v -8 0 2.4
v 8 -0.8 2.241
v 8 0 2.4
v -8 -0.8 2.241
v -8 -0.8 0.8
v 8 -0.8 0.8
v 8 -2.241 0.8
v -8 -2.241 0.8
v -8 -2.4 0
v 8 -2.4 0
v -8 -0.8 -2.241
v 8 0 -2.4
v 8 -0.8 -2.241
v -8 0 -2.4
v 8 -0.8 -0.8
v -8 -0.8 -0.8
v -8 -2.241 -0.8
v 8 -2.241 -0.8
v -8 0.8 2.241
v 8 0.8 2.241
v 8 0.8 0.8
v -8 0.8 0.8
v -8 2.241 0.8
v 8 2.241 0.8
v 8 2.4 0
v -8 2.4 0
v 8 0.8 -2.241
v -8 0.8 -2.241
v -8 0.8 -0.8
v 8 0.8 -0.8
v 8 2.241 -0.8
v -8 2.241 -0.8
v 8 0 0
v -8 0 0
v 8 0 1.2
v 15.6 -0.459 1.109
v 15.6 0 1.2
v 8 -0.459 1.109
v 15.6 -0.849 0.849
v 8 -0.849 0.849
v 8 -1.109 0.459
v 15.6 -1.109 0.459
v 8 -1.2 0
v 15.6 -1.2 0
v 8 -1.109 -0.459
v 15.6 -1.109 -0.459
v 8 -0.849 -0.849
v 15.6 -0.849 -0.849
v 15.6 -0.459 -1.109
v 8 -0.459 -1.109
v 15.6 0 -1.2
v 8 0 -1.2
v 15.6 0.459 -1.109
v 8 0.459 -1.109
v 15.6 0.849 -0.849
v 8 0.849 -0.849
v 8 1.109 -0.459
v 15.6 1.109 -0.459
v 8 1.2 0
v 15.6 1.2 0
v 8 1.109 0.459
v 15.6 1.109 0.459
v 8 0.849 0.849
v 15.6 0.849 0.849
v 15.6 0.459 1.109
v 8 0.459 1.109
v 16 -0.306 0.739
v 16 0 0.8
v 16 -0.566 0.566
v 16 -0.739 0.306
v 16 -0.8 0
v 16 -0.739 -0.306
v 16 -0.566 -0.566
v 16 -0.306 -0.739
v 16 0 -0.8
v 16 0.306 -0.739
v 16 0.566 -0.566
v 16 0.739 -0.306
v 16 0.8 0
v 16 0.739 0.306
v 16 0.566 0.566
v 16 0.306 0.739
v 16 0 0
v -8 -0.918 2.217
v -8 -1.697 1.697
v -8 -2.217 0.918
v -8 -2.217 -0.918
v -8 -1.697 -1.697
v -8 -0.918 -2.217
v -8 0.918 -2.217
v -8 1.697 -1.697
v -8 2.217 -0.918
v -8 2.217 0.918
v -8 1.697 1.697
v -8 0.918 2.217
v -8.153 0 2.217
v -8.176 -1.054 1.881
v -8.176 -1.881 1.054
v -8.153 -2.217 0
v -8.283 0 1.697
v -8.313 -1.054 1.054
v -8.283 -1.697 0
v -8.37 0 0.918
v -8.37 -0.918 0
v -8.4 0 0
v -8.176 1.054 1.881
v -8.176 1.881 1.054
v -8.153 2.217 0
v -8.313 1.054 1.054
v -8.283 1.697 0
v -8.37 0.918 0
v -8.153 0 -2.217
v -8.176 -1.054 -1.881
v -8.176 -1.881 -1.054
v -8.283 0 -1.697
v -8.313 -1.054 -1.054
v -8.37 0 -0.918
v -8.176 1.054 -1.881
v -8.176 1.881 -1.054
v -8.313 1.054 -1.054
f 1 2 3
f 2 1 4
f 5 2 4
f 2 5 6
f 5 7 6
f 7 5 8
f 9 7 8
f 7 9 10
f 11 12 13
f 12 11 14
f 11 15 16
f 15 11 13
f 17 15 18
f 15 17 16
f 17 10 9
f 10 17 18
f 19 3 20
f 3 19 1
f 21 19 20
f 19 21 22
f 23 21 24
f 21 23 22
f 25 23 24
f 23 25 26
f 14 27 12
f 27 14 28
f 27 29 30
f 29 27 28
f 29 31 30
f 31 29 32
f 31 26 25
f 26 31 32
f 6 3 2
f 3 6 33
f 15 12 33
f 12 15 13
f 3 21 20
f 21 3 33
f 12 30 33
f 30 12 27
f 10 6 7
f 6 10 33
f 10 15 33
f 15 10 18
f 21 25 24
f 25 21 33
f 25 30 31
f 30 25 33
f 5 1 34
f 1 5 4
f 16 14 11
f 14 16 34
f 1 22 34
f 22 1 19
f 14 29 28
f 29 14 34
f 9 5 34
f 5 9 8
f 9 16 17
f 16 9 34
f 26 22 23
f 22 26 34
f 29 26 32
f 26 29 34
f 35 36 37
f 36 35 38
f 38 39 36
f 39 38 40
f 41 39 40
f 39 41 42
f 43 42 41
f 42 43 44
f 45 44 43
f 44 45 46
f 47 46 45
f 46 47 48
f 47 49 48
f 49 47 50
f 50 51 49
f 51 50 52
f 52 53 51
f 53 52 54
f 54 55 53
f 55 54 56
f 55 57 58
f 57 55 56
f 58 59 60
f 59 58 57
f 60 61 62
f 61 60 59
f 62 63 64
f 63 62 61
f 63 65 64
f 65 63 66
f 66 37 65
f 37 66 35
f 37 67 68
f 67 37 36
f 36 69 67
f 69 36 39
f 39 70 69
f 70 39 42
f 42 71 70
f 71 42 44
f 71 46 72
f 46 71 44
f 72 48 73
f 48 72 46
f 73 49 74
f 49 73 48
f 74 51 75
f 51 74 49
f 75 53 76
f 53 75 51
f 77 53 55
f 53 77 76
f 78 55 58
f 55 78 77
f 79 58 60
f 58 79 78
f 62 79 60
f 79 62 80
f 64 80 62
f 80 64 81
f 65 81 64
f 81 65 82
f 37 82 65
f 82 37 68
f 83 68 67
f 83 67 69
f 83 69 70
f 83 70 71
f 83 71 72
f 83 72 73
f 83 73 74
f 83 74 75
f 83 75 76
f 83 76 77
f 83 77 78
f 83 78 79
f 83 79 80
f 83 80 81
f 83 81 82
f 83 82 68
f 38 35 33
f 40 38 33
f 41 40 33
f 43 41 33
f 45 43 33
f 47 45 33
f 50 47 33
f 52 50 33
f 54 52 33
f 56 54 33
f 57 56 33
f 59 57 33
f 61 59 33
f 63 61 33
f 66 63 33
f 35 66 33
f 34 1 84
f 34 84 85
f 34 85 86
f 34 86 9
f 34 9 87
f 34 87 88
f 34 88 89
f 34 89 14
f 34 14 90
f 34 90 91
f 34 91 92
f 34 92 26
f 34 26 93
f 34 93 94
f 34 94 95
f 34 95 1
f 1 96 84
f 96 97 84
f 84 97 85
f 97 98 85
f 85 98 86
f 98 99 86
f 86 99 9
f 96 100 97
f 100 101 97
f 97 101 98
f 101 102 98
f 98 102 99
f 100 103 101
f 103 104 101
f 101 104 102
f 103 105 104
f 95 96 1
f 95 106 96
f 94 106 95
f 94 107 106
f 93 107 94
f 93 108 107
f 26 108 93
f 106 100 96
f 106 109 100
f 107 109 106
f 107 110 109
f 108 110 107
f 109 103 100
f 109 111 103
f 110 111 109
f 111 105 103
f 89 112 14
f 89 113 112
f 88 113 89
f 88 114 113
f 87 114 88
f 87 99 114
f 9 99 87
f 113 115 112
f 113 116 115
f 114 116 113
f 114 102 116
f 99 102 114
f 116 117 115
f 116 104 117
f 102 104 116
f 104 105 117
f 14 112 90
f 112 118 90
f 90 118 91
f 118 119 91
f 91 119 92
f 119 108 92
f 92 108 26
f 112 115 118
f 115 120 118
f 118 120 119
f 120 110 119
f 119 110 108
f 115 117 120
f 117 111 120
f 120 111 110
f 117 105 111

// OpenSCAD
// file: ../p/1-8sphe.scad
use <../lib.scad>
function ldraw_lib__1_8sphe() = [
// 0 Sphere 0.125
// 0 Name: 1-8sphe.dat
// 0 Author: James Jessiman
// 0 !LDRAW_ORG Primitive UPDATE 2012-03
// 0 !LICENSE Licensed under CC BY 2.0 and CC BY 4.0 : see CAreadme.txt
// 
// 0 BFC CERTIFY CCW
  [0,"BFC","CERTIFY"],
  [0,"BFC","CCW"],
// 
// 0 !HISTORY 2000-08-01 {Axel Poque} fixes to resolve L3P error messages.
// 0 !HISTORY 2000-08-01 {Manfred Moolhuysen} fixes to resolve L3P error messages.
// 0 !HISTORY 2000-09-30 [PTadmin] Official Update 2000-02
// 0 !HISTORY 2002-03-28 [hafhead] Made BFC compliant
// 0 !HISTORY 2002-04-25 [PTadmin] Official Update 2002-02
// 0 !HISTORY 2007-06-22 [PTadmin] Header formatted for Contributor Agreement
// 0 !HISTORY 2008-07-01 [PTadmin] Official Update 2008-01
// 0 !HISTORY 2010-09-12 [MagFors] Changed winding, removed duplicated cond-line, optimized filesize
// 0 !HISTORY 2010-12-31 [PTadmin] Official Update 2010-03
// 0 !HISTORY 2012-07-01 [tcobbs] Replaced with geometry from LDView
// 0 !HISTORY 2012-12-28 [PTadmin] Official Update 2012-03
// 
// 
// 3 16 1 0 0 0.9239 0.3827 0 0.9239 0 0.3827
  [3,16,1,0,0,0.9239,0.3827,0,0.9239,0,0.3827],
// 3 16 0.9239 0.3827 0 0.7836 0.4393 0.4393 0.9239 0 0.3827
  [3,16,0.9239,0.3827,0,0.7836,0.4393,0.4393,0.9239,0,0.3827],
// 3 16 0.9239 0 0.3827 0.7836 0.4393 0.4393 0.7071 0 0.7071
  [3,16,0.9239,0,0.3827,0.7836,0.4393,0.4393,0.7071,0,0.7071],
// 3 16 0.7836 0.4393 0.4393 0.4393 0.4393 0.7836 0.7071 0 0.7071
  [3,16,0.7836,0.4393,0.4393,0.4393,0.4393,0.7836,0.7071,0,0.7071],
// 3 16 0.7071 0 0.7071 0.4393 0.4393 0.7836 0.3827 0 0.9239
  [3,16,0.7071,0,0.7071,0.4393,0.4393,0.7836,0.3827,0,0.9239],
// 3 16 0.4393 0.4393 0.7836 0 0.3827 0.9239 0.3827 0 0.9239
  [3,16,0.4393,0.4393,0.7836,0,0.3827,0.9239,0.3827,0,0.9239],
// 3 16 0.3827 0 0.9239 0 0.3827 0.9239 0 0 1
  [3,16,0.3827,0,0.9239,0,0.3827,0.9239,0,0,1],
// 3 16 0.9239 0.3827 0 0.7071 0.7071 0 0.7836 0.4393 0.4393
  [3,16,0.9239,0.3827,0,0.7071,0.7071,0,0.7836,0.4393,0.4393],
// 3 16 0.7071 0.7071 0 0.4393 0.7836 0.4393 0.7836 0.4393 0.4393
  [3,16,0.7071,0.7071,0,0.4393,0.7836,0.4393,0.7836,0.4393,0.4393],
// 3 16 0.7836 0.4393 0.4393 0.4393 0.7836 0.4393 0.4393 0.4393 0.7836
  [3,16,0.7836,0.4393,0.4393,0.4393,0.7836,0.4393,0.4393,0.4393,0.7836],
// 3 16 0.4393 0.7836 0.4393 0 0.7071 0.7071 0.4393 0.4393 0.7836
  [3,16,0.4393,0.7836,0.4393,0,0.7071,0.7071,0.4393,0.4393,0.7836],
// 3 16 0.4393 0.4393 0.7836 0 0.7071 0.7071 0 0.3827 0.9239
  [3,16,0.4393,0.4393,0.7836,0,0.7071,0.7071,0,0.3827,0.9239],
// 3 16 0.7071 0.7071 0 0.3827 0.9239 0 0.4393 0.7836 0.4393
  [3,16,0.7071,0.7071,0,0.3827,0.9239,0,0.4393,0.7836,0.4393],
// 3 16 0.3827 0.9239 0 0 0.9239 0.3827 0.4393 0.7836 0.4393
  [3,16,0.3827,0.9239,0,0,0.9239,0.3827,0.4393,0.7836,0.4393],
// 3 16 0.4393 0.7836 0.4393 0 0.9239 0.3827 0 0.7071 0.7071
  [3,16,0.4393,0.7836,0.4393,0,0.9239,0.3827,0,0.7071,0.7071],
// 3 16 0.3827 0.9239 0 0 1 0 0 0.9239 0.3827
  [3,16,0.3827,0.9239,0,0,1,0,0,0.9239,0.3827],
// 
// 5 24 1 0 0 0.9239 0.3827 0 1 0 -0.1 0.9239 0 0.3827
  [5,24,1,0,0,0.9239,0.3827,0,1,0,-0.1,0.9239,0,0.3827],
// 5 24 0.9239 0.3827 0 0.9239 0 0.3827 1 0 0 0.7836 0.4393 0.4393
  [5,24,0.9239,0.3827,0,0.9239,0,0.3827,1,0,0,0.7836,0.4393,0.4393],
// 5 24 1 0 0 0.9239 0 0.3827 0.9239 0.3827 0 1 -0.1 0
  [5,24,1,0,0,0.9239,0,0.3827,0.9239,0.3827,0,1,-0.1,0],
// 5 24 0.9239 0 0.3827 0.7836 0.4393 0.4393 0.9239 0.3827 0 0.7071 0 0.7071
  [5,24,0.9239,0,0.3827,0.7836,0.4393,0.4393,0.9239,0.3827,0,0.7071,0,0.7071],
// 5 24 0.7836 0.4393 0.4393 0.7071 0 0.7071 0.9239 0 0.3827 0.4393 0.4393 0.7836
  [5,24,0.7836,0.4393,0.4393,0.7071,0,0.7071,0.9239,0,0.3827,0.4393,0.4393,0.7836],
// 5 24 0.9239 0 0.3827 0.7071 0 0.7071 0.7836 0.4393 0.4393 0.9239 -0.1 0.3827
  [5,24,0.9239,0,0.3827,0.7071,0,0.7071,0.7836,0.4393,0.4393,0.9239,-0.1,0.3827],
// 5 24 0.7071 0 0.7071 0.4393 0.4393 0.7836 0.7836 0.4393 0.4393 0.3827 0 0.9239
  [5,24,0.7071,0,0.7071,0.4393,0.4393,0.7836,0.7836,0.4393,0.4393,0.3827,0,0.9239],
// 5 24 0.4393 0.4393 0.7836 0.3827 0 0.9239 0.7071 0 0.7071 0 0.3827 0.9239
  [5,24,0.4393,0.4393,0.7836,0.3827,0,0.9239,0.7071,0,0.7071,0,0.3827,0.9239],
// 5 24 0.7071 0 0.7071 0.3827 0 0.9239 0.4393 0.4393 0.7836 0.7071 -0.1 0.7071
  [5,24,0.7071,0,0.7071,0.3827,0,0.9239,0.4393,0.4393,0.7836,0.7071,-0.1,0.7071],
// 5 24 0.3827 0 0.9239 0 0.3827 0.9239 0.4393 0.4393 0.7836 0 0 1
  [5,24,0.3827,0,0.9239,0,0.3827,0.9239,0.4393,0.4393,0.7836,0,0,1],
// 5 24 0 0.3827 0.9239 0 0 1 0.3827 0 0.9239 -0.1 0.3827 0.9239
  [5,24,0,0.3827,0.9239,0,0,1,0.3827,0,0.9239,-0.1,0.3827,0.9239],
// 5 24 0.3827 0 0.9239 0 0 1 0 0.3827 0.9239 0.3827 -0.1 0.9239
  [5,24,0.3827,0,0.9239,0,0,1,0,0.3827,0.9239,0.3827,-0.1,0.9239],
// 5 24 0.9239 0.3827 0 0.7071 0.7071 0 0.9239 0.3827 -0.1 0.7836 0.4393 0.4393
  [5,24,0.9239,0.3827,0,0.7071,0.7071,0,0.9239,0.3827,-0.1,0.7836,0.4393,0.4393],
// 5 24 0.7071 0.7071 0 0.7836 0.4393 0.4393 0.9239 0.3827 0 0.4393 0.7836 0.4393
  [5,24,0.7071,0.7071,0,0.7836,0.4393,0.4393,0.9239,0.3827,0,0.4393,0.7836,0.4393],
// 5 24 0.9239 0.3827 0 0.7836 0.4393 0.4393 0.7071 0.7071 0 0.9239 0 0.3827
  [5,24,0.9239,0.3827,0,0.7836,0.4393,0.4393,0.7071,0.7071,0,0.9239,0,0.3827],
// 5 24 0.7836 0.4393 0.4393 0.4393 0.7836 0.4393 0.7071 0.7071 0 0.4393 0.4393 0.7836
  [5,24,0.7836,0.4393,0.4393,0.4393,0.7836,0.4393,0.7071,0.7071,0,0.4393,0.4393,0.7836],
// 5 24 0.4393 0.7836 0.4393 0.4393 0.4393 0.7836 0.7836 0.4393 0.4393 0 0.7071 0.7071
  [5,24,0.4393,0.7836,0.4393,0.4393,0.4393,0.7836,0.7836,0.4393,0.4393,0,0.7071,0.7071],
// 5 24 0.7836 0.4393 0.4393 0.4393 0.4393 0.7836 0.4393 0.7836 0.4393 0.7071 0 0.7071
  [5,24,0.7836,0.4393,0.4393,0.4393,0.4393,0.7836,0.4393,0.7836,0.4393,0.7071,0,0.7071],
// 5 24 0.4393 0.4393 0.7836 0 0.7071 0.7071 0.4393 0.7836 0.4393 0 0.3827 0.9239
  [5,24,0.4393,0.4393,0.7836,0,0.7071,0.7071,0.4393,0.7836,0.4393,0,0.3827,0.9239],
// 5 24 0 0.7071 0.7071 0 0.3827 0.9239 0.4393 0.4393 0.7836 -0.1 0.7071 0.7071
  [5,24,0,0.7071,0.7071,0,0.3827,0.9239,0.4393,0.4393,0.7836,-0.1,0.7071,0.7071],
// 5 24 0.4393 0.4393 0.7836 0 0.3827 0.9239 0 0.7071 0.7071 0.3827 0 0.9239
  [5,24,0.4393,0.4393,0.7836,0,0.3827,0.9239,0,0.7071,0.7071,0.3827,0,0.9239],
// 5 24 0.7071 0.7071 0 0.3827 0.9239 0 0.7071 0.7071 -0.1 0.4393 0.7836 0.4393
  [5,24,0.7071,0.7071,0,0.3827,0.9239,0,0.7071,0.7071,-0.1,0.4393,0.7836,0.4393],
// 5 24 0.3827 0.9239 0 0.4393 0.7836 0.4393 0.7071 0.7071 0 0 0.9239 0.3827
  [5,24,0.3827,0.9239,0,0.4393,0.7836,0.4393,0.7071,0.7071,0,0,0.9239,0.3827],
// 5 24 0.7071 0.7071 0 0.4393 0.7836 0.4393 0.3827 0.9239 0 0.7836 0.4393 0.4393
  [5,24,0.7071,0.7071,0,0.4393,0.7836,0.4393,0.3827,0.9239,0,0.7836,0.4393,0.4393],
// 5 24 0.4393 0.7836 0.4393 0 0.9239 0.3827 0.3827 0.9239 0 0 0.7071 0.7071
  [5,24,0.4393,0.7836,0.4393,0,0.9239,0.3827,0.3827,0.9239,0,0,0.7071,0.7071],
// 5 24 0 0.9239 0.3827 0 0.7071 0.7071 0.4393 0.7836 0.4393 -0.1 0.9239 0.3827
  [5,24,0,0.9239,0.3827,0,0.7071,0.7071,0.4393,0.7836,0.4393,-0.1,0.9239,0.3827],
// 5 24 0.4393 0.7836 0.4393 0 0.7071 0.7071 0 0.9239 0.3827 0.4393 0.4393 0.7836
  [5,24,0.4393,0.7836,0.4393,0,0.7071,0.7071,0,0.9239,0.3827,0.4393,0.4393,0.7836],
// 5 24 0.3827 0.9239 0 0 1 0 0.3827 0.9239 -0.1 0 0.9239 0.3827
  [5,24,0.3827,0.9239,0,0,1,0,0.3827,0.9239,-0.1,0,0.9239,0.3827],
// 5 24 0 1 0 0 0.9239 0.3827 0.3827 0.9239 0 -0.1 1 0
  [5,24,0,1,0,0,0.9239,0.3827,0.3827,0.9239,0,-0.1,1,0],
// 5 24 0.3827 0.9239 0 0 0.9239 0.3827 0 1 0 0.4393 0.7836 0.4393
  [5,24,0.3827,0.9239,0,0,0.9239,0.3827,0,1,0,0.4393,0.7836,0.4393],
];
makepoly(ldraw_lib__1_8sphe(), line=0.2);
// file: ../p/axle.scad
use <../lib.scad>
function ldraw_lib__axle() = [
// 0 Axle
// 0 Name: axle.dat
// 0 Author: James Jessiman
// 0 !LDRAW_ORG Primitive UPDATE 2003-01
// 0 !LICENSE Licensed under CC BY 2.0 and CC BY 4.0 : see CAreadme.txt
// 
// 0 BFC CERTIFY CCW
  [0,"BFC","CERTIFY"],
  [0,"BFC","CCW"],
// 
// 0 !HISTORY 2000-04-23 [sbliss] Added conditional edges along outermost diameters
// 0 !HISTORY 2000-05-07 [PTadmin] Official Update 2000-01
// 0 !HISTORY 2002-11-08 [OrionP] Adjusted fit and precision
// 0 !HISTORY 2003-03-12 [PTadmin] Official Update 2003-01
// 0 !HISTORY 2007-06-24 [PTadmin] Header formatted for Contributor Agreement
// 0 !HISTORY 2008-07-01 [PTadmin] Official Update 2008-01
// 
// 
// 5 24 6 0 0 6 1 0 5.602 0 2 5.602 0 -2
  [5,24,6,0,0,6,1,0,5.602,0,2,5.602,0,-2],
// 5 24 0 0 6 0 1 6 2 0 5.602 -2 0 5.602
  [5,24,0,0,6,0,1,6,2,0,5.602,-2,0,5.602],
// 5 24 -6 0 0 -6 1 0 -5.602 0 -2 -5.602 0 2
  [5,24,-6,0,0,-6,1,0,-5.602,0,-2,-5.602,0,2],
// 5 24 0 0 -6 0 1 -6 -2 0 -5.602 2 0 -5.602
  [5,24,0,0,-6,0,1,-6,-2,0,-5.602,2,0,-5.602],
// 
// 2 24 6 0 0 5.602 0 2
  [2,24,6,0,0,5.602,0,2],
// 2 24 5.602 0 2 2 0 2
  [2,24,5.602,0,2,2,0,2],
// 2 24 2 0 2 2 0 5.602
  [2,24,2,0,2,2,0,5.602],
// 2 24 2 0 5.602 0 0 6
  [2,24,2,0,5.602,0,0,6],
// 2 24 -6 0 0 -5.602 0 2
  [2,24,-6,0,0,-5.602,0,2],
// 2 24 -5.602 0 2 -2 0 2
  [2,24,-5.602,0,2,-2,0,2],
// 2 24 -2 0 2 -2 0 5.602
  [2,24,-2,0,2,-2,0,5.602],
// 2 24 -2 0 5.602 -0 0 6
  [2,24,-2,0,5.602,-0,0,6],
// 2 24 6 0 -0 5.602 0 -2
  [2,24,6,0,-0,5.602,0,-2],
// 2 24 5.602 0 -2 2 0 -2
  [2,24,5.602,0,-2,2,0,-2],
// 2 24 2 0 -2 2 0 -5.602
  [2,24,2,0,-2,2,0,-5.602],
// 2 24 2 0 -5.602 0 0 -6
  [2,24,2,0,-5.602,0,0,-6],
// 2 24 -6 0 -0 -5.602 0 -2
  [2,24,-6,0,-0,-5.602,0,-2],
// 2 24 -5.602 0 -2 -2 0 -2
  [2,24,-5.602,0,-2,-2,0,-2],
// 2 24 -2 0 -2 -2 0 -5.602
  [2,24,-2,0,-2,-2,0,-5.602],
// 2 24 -2 0 -5.602 -0 0 -6
  [2,24,-2,0,-5.602,-0,0,-6],
// 2 24 6 1 0 5.602 1 2
  [2,24,6,1,0,5.602,1,2],
// 2 24 5.602 1 2 2 1 2
  [2,24,5.602,1,2,2,1,2],
// 2 24 2 1 2 2 1 5.602
  [2,24,2,1,2,2,1,5.602],
// 2 24 2 1 5.602 0 1 6
  [2,24,2,1,5.602,0,1,6],
// 2 24 -6 1 0 -5.602 1 2
  [2,24,-6,1,0,-5.602,1,2],
// 2 24 -5.602 1 2 -2 1 2
  [2,24,-5.602,1,2,-2,1,2],
// 2 24 -2 1 2 -2 1 5.602
  [2,24,-2,1,2,-2,1,5.602],
// 2 24 -2 1 5.602 -0 1 6
  [2,24,-2,1,5.602,-0,1,6],
// 2 24 6 1 -0 5.602 1 -2
  [2,24,6,1,-0,5.602,1,-2],
// 2 24 5.602 1 -2 2 1 -2
  [2,24,5.602,1,-2,2,1,-2],
// 2 24 2 1 -2 2 1 -5.602
  [2,24,2,1,-2,2,1,-5.602],
// 2 24 2 1 -5.602 0 1 -6
  [2,24,2,1,-5.602,0,1,-6],
// 2 24 -6 1 -0 -5.602 1 -2
  [2,24,-6,1,-0,-5.602,1,-2],
// 2 24 -5.602 1 -2 -2 1 -2
  [2,24,-5.602,1,-2,-2,1,-2],
// 2 24 -2 1 -2 -2 1 -5.602
  [2,24,-2,1,-2,-2,1,-5.602],
// 2 24 -2 1 -5.602 -0 1 -6
  [2,24,-2,1,-5.602,-0,1,-6],
// 
// 2 24 5.602 0 2 5.602 1 2
  [2,24,5.602,0,2,5.602,1,2],
// 2 24 2 0 2 2 1 2
  [2,24,2,0,2,2,1,2],
// 2 24 2 0 5.602 2 1 5.602
  [2,24,2,0,5.602,2,1,5.602],
// 2 24 -5.602 0 2 -5.602 1 2
  [2,24,-5.602,0,2,-5.602,1,2],
// 2 24 -2 0 2 -2 1 2
  [2,24,-2,0,2,-2,1,2],
// 2 24 -2 0 5.602 -2 1 5.602
  [2,24,-2,0,5.602,-2,1,5.602],
// 2 24 5.602 0 -2 5.602 1 -2
  [2,24,5.602,0,-2,5.602,1,-2],
// 2 24 2 0 -2 2 1 -2
  [2,24,2,0,-2,2,1,-2],
// 2 24 2 0 -5.602 2 1 -5.602
  [2,24,2,0,-5.602,2,1,-5.602],
// 2 24 -5.602 0 -2 -5.602 1 -2
  [2,24,-5.602,0,-2,-5.602,1,-2],
// 2 24 -2 0 -2 -2 1 -2
  [2,24,-2,0,-2,-2,1,-2],
// 2 24 -2 0 -5.602 -2 1 -5.602
  [2,24,-2,0,-5.602,-2,1,-5.602],
// 
// 4 16 6 0 0 6 1 0 5.602 1 2 5.602 0 2
  [4,16,6,0,0,6,1,0,5.602,1,2,5.602,0,2],
// 4 16 5.602 0 2 5.602 1 2 2 1 2 2 0 2
  [4,16,5.602,0,2,5.602,1,2,2,1,2,2,0,2],
// 4 16 2 0 2 2 1 2 2 1 5.602 2 0 5.602
  [4,16,2,0,2,2,1,2,2,1,5.602,2,0,5.602],
// 4 16 2 0 5.602 2 1 5.602 0 1 6 0 0 6
  [4,16,2,0,5.602,2,1,5.602,0,1,6,0,0,6],
// 4 16 -6 0 0 -5.602 0 2 -5.602 1 2 -6 1 0
  [4,16,-6,0,0,-5.602,0,2,-5.602,1,2,-6,1,0],
// 4 16 -5.602 0 2 -2 0 2 -2 1 2 -5.602 1 2
  [4,16,-5.602,0,2,-2,0,2,-2,1,2,-5.602,1,2],
// 4 16 -2 0 2 -2 0 5.602 -2 1 5.602 -2 1 2
  [4,16,-2,0,2,-2,0,5.602,-2,1,5.602,-2,1,2],
// 4 16 -2 0 5.602 -0 0 6 -0 1 6 -2 1 5.602
  [4,16,-2,0,5.602,-0,0,6,-0,1,6,-2,1,5.602],
// 4 16 6 0 -0 5.602 0 -2 5.602 1 -2 6 1 -0
  [4,16,6,0,-0,5.602,0,-2,5.602,1,-2,6,1,-0],
// 4 16 5.602 0 -2 2 0 -2 2 1 -2 5.602 1 -2
  [4,16,5.602,0,-2,2,0,-2,2,1,-2,5.602,1,-2],
// 4 16 2 0 -2 2 0 -5.602 2 1 -5.602 2 1 -2
  [4,16,2,0,-2,2,0,-5.602,2,1,-5.602,2,1,-2],
// 4 16 2 0 -5.602 0 0 -6 0 1 -6 2 1 -5.602
  [4,16,2,0,-5.602,0,0,-6,0,1,-6,2,1,-5.602],
// 4 16 -6 0 -0 -6 1 -0 -5.602 1 -2 -5.602 0 -2
  [4,16,-6,0,-0,-6,1,-0,-5.602,1,-2,-5.602,0,-2],
// 4 16 -5.602 0 -2 -5.602 1 -2 -2 1 -2 -2 0 -2
  [4,16,-5.602,0,-2,-5.602,1,-2,-2,1,-2,-2,0,-2],
// 4 16 -2 0 -2 -2 1 -2 -2 1 -5.602 -2 0 -5.602
  [4,16,-2,0,-2,-2,1,-2,-2,1,-5.602,-2,0,-5.602],
// 4 16 -2 0 -5.602 -2 1 -5.602 -0 1 -6 -0 0 -6
  [4,16,-2,0,-5.602,-2,1,-5.602,-0,1,-6,-0,0,-6],
// 
// 4 16 6 0 0 5.602 0 2 2 0 2 0 0 0
  [4,16,6,0,0,5.602,0,2,2,0,2,0,0,0],
// 4 16 -6 0 0 0 0 0 -2 0 2 -5.602 0 2
  [4,16,-6,0,0,0,0,0,-2,0,2,-5.602,0,2],
// 4 16 6 0 0 0 0 0 2 0 -2 5.602 0 -2
  [4,16,6,0,0,0,0,0,2,0,-2,5.602,0,-2],
// 4 16 -6 0 0 -5.602 0 -2 -2 0 -2 0 0 0
  [4,16,-6,0,0,-5.602,0,-2,-2,0,-2,0,0,0],
// 4 16 0 0 6 0 0 0 2 0 2 2 0 5.602
  [4,16,0,0,6,0,0,0,2,0,2,2,0,5.602],
// 4 16 0 0 6 -2 0 5.602 -2 0 2 0 0 0
  [4,16,0,0,6,-2,0,5.602,-2,0,2,0,0,0],
// 4 16 0 0 -6 2 0 -5.602 2 0 -2 0 0 0
  [4,16,0,0,-6,2,0,-5.602,2,0,-2,0,0,0],
// 4 16 0 0 -6 0 0 0 -2 0 -2 -2 0 -5.602
  [4,16,0,0,-6,0,0,0,-2,0,-2,-2,0,-5.602],
// 4 16 6 1 0 0 1 0 2 1 2 5.602 1 2
  [4,16,6,1,0,0,1,0,2,1,2,5.602,1,2],
// 4 16 -6 1 0 -5.602 1 2 -2 1 2 0 1 0
  [4,16,-6,1,0,-5.602,1,2,-2,1,2,0,1,0],
// 4 16 6 1 0 5.602 1 -2 2 1 -2 0 1 0
  [4,16,6,1,0,5.602,1,-2,2,1,-2,0,1,0],
// 4 16 -6 1 0 0 1 0 -2 1 -2 -5.602 1 -2
  [4,16,-6,1,0,0,1,0,-2,1,-2,-5.602,1,-2],
// 4 16 0 1 6 2 1 5.602 2 1 2 0 1 0
  [4,16,0,1,6,2,1,5.602,2,1,2,0,1,0],
// 4 16 0 1 6 0 1 0 -2 1 2 -2 1 5.602
  [4,16,0,1,6,0,1,0,-2,1,2,-2,1,5.602],
// 4 16 0 1 -6 0 1 0 2 1 -2 2 1 -5.602
  [4,16,0,1,-6,0,1,0,2,1,-2,2,1,-5.602],
// 4 16 0 1 -6 -2 1 -5.602 -2 1 -2 0 1 0
  [4,16,0,1,-6,-2,1,-5.602,-2,1,-2,0,1,0],
// 0
];
makepoly(ldraw_lib__axle(), line=0.2);
// file: ../p/4-8sphe.scad
use <../lib.scad>
use <1-8sphe.scad>
function ldraw_lib__4_8sphe() = [
// 0 Sphere 0.5
// 0 Name: 4-8sphe.dat
// 0 Author: James Jessiman
// 0 !LDRAW_ORG Primitive UPDATE 2003-02
// 0 !LICENSE Licensed under CC BY 2.0 and CC BY 4.0 : see CAreadme.txt
// 
// 0 BFC CERTIFY CCW
  [0,"BFC","CERTIFY"],
  [0,"BFC","CCW"],
// 
// 0 !HISTORY 2002-08-31 [izanette] Modified with WINDZ for BFC compliance
// 0 !HISTORY 2003-08-01 [PTadmin] Official Update 2003-02
// 0 !HISTORY 2007-06-24 [PTadmin] Header formatted for Contributor Agreement
// 0 !HISTORY 2008-07-01 [PTadmin] Official Update 2008-01
// 
// 
// 1 16 0 0 0 1 0 0 0 1 0 0 0 1 1-8sphe.dat
  [1,16,0,0,0,1,0,0,0,1,0,0,0,1, ldraw_lib__1_8sphe()],
// 1 16 0 0 0 1 0 0 0 1 0 0 0 -1 1-8sphe.dat
  [1,16,0,0,0,1,0,0,0,1,0,0,0,-1, ldraw_lib__1_8sphe()],
// 1 16 0 0 0 -1 0 0 0 1 0 0 0 1 1-8sphe.dat
  [1,16,0,0,0,-1,0,0,0,1,0,0,0,1, ldraw_lib__1_8sphe()],
// 1 16 0 0 0 -1 0 0 0 1 0 0 0 -1 1-8sphe.dat
  [1,16,0,0,0,-1,0,0,0,1,0,0,0,-1, ldraw_lib__1_8sphe()],
// 0
// 
];
makepoly(ldraw_lib__4_8sphe(), line=0.2);
// file: ../p/4-4edge.scad
use <../lib.scad>
function ldraw_lib__4_4edge() = [
// 0 Circle 1.0
// 0 Name: 4-4edge.dat
// 0 Author: James Jessiman
// 0 !LDRAW_ORG Primitive UPDATE 2017-01
// 0 !LICENSE Licensed under CC BY 2.0 and CC BY 4.0 : see CAreadme.txt
// 
// 0 BFC CERTIFY CCW
  [0,"BFC","CERTIFY"],
  [0,"BFC","CCW"],
// 
// 0 !HISTORY 1998-12-15 [PTadmin] Official Update 1998-10
// 0 !HISTORY 2005-12-28 [PTadmin] Official Update 2005-01
// 0 !HISTORY 2007-06-24 [PTadmin] Header formatted for Contributor Agreement
// 0 !HISTORY 2008-07-01 [PTadmin] Official Update 2008-01
// 0 !HISTORY 2017-01-15 [Steffen] BFCed
// 0 !HISTORY 2017-12-30 [PTadmin] Official Update 2017-01
// 
// 
// 2 24 1 0 0 0.9239 0 0.3827
  [2,24,1,0,0,0.9239,0,0.3827],
// 2 24 0.9239 0 0.3827 0.7071 0 0.7071
  [2,24,0.9239,0,0.3827,0.7071,0,0.7071],
// 2 24 0.7071 0 0.7071 0.3827 0 0.9239
  [2,24,0.7071,0,0.7071,0.3827,0,0.9239],
// 2 24 0.3827 0 0.9239 0 0 1
  [2,24,0.3827,0,0.9239,0,0,1],
// 2 24 0 0 1 -0.3827 0 0.9239
  [2,24,0,0,1,-0.3827,0,0.9239],
// 2 24 -0.3827 0 0.9239 -0.7071 0 0.7071
  [2,24,-0.3827,0,0.9239,-0.7071,0,0.7071],
// 2 24 -0.7071 0 0.7071 -0.9239 0 0.3827
  [2,24,-0.7071,0,0.7071,-0.9239,0,0.3827],
// 2 24 -0.9239 0 0.3827 -1 0 -0
  [2,24,-0.9239,0,0.3827,-1,0,-0],
// 2 24 -1 0 -0 -0.9239 0 -0.3827
  [2,24,-1,0,-0,-0.9239,0,-0.3827],
// 2 24 -0.9239 0 -0.3827 -0.7071 0 -0.7071
  [2,24,-0.9239,0,-0.3827,-0.7071,0,-0.7071],
// 2 24 -0.7071 0 -0.7071 -0.3827 0 -0.9239
  [2,24,-0.7071,0,-0.7071,-0.3827,0,-0.9239],
// 2 24 -0.3827 0 -0.9239 0 0 -1
  [2,24,-0.3827,0,-0.9239,0,0,-1],
// 2 24 0 0 -1 0.3827 0 -0.9239
  [2,24,0,0,-1,0.3827,0,-0.9239],
// 2 24 0.3827 0 -0.9239 0.7071 0 -0.7071
  [2,24,0.3827,0,-0.9239,0.7071,0,-0.7071],
// 2 24 0.7071 0 -0.7071 0.9239 0 -0.3827
  [2,24,0.7071,0,-0.7071,0.9239,0,-0.3827],
// 2 24 0.9239 0 -0.3827 1 0 0
  [2,24,0.9239,0,-0.3827,1,0,0],
];
makepoly(ldraw_lib__4_4edge(), line=0.2);
// file: ../p/4-4disc.scad
use <../lib.scad>
function ldraw_lib__4_4disc() = [
// 0 Disc 1.0
// 0 Name: 4-4disc.dat
// 0 Author: James Jessiman
// 0 !LDRAW_ORG Primitive UPDATE 2002-02
// 0 !LICENSE Licensed under CC BY 2.0 and CC BY 4.0 : see CAreadme.txt
// 
// 0 BFC CERTIFY CCW
  [0,"BFC","CERTIFY"],
  [0,"BFC","CCW"],
// 
// 0 !HISTORY 1998-12-15 [PTadmin] Official Update 1998-10
// 0 !HISTORY 2002-03-23 [sbliss] Added BFC statement
// 0 !HISTORY 2002-04-25 [PTadmin] Official Update 2002-02
// 0 !HISTORY 2007-06-24 [PTadmin] Header formatted for Contributor Agreement
// 0 !HISTORY 2008-07-01 [PTadmin] Official Update 2008-01
// 
// 
// 3 16 0 0 0 1 0 0 0.9239 0 0.3827
  [3,16,0,0,0,1,0,0,0.9239,0,0.3827],
// 3 16 0 0 0 0.9239 0 0.3827 0.7071 0 0.7071
  [3,16,0,0,0,0.9239,0,0.3827,0.7071,0,0.7071],
// 3 16 0 0 0 0.7071 0 0.7071 0.3827 0 0.9239
  [3,16,0,0,0,0.7071,0,0.7071,0.3827,0,0.9239],
// 3 16 0 0 0 0.3827 0 0.9239 0 0 1
  [3,16,0,0,0,0.3827,0,0.9239,0,0,1],
// 3 16 0 0 0 0 0 1 -0.3827 0 0.9239
  [3,16,0,0,0,0,0,1,-0.3827,0,0.9239],
// 3 16 0 0 0 -0.3827 0 0.9239 -0.7071 0 0.7071
  [3,16,0,0,0,-0.3827,0,0.9239,-0.7071,0,0.7071],
// 3 16 0 0 0 -0.7071 0 0.7071 -0.9239 0 0.3827
  [3,16,0,0,0,-0.7071,0,0.7071,-0.9239,0,0.3827],
// 3 16 0 0 0 -0.9239 0 0.3827 -1 0 -0
  [3,16,0,0,0,-0.9239,0,0.3827,-1,0,-0],
// 3 16 0 0 0 -1 0 -0 -0.9239 0 -0.3827
  [3,16,0,0,0,-1,0,-0,-0.9239,0,-0.3827],
// 3 16 0 0 0 -0.9239 0 -0.3827 -0.7071 0 -0.7071
  [3,16,0,0,0,-0.9239,0,-0.3827,-0.7071,0,-0.7071],
// 3 16 0 0 0 -0.7071 0 -0.7071 -0.3827 0 -0.9239
  [3,16,0,0,0,-0.7071,0,-0.7071,-0.3827,0,-0.9239],
// 3 16 0 0 0 -0.3827 0 -0.9239 0 0 -1
  [3,16,0,0,0,-0.3827,0,-0.9239,0,0,-1],
// 3 16 0 0 0 0 0 -1 0.3827 0 -0.9239
  [3,16,0,0,0,0,0,-1,0.3827,0,-0.9239],
// 3 16 0 0 0 0.3827 0 -0.9239 0.7071 0 -0.7071
  [3,16,0,0,0,0.3827,0,-0.9239,0.7071,0,-0.7071],
// 3 16 0 0 0 0.7071 0 -0.7071 0.9239 0 -0.3827
  [3,16,0,0,0,0.7071,0,-0.7071,0.9239,0,-0.3827],
// 3 16 0 0 0 0.9239 0 -0.3827 1 0 0
  [3,16,0,0,0,0.9239,0,-0.3827,1,0,0],
// 0
];
makepoly(ldraw_lib__4_4disc(), line=0.2);
// file: ../p/4-4cyli.scad
use <../lib.scad>
function ldraw_lib__4_4cyli() = [
// 0 Cylinder 1.0
// 0 Name: 4-4cyli.dat
// 0 Author: James Jessiman
// 0 !LDRAW_ORG Primitive UPDATE 2005-01
// 0 !LICENSE Licensed under CC BY 2.0 and CC BY 4.0 : see CAreadme.txt
// 
// 0 BFC CERTIFY CCW
  [0,"BFC","CERTIFY"],
  [0,"BFC","CCW"],
// 
// 0 !HISTORY 1998-12-15 [PTadmin] Official Update 1998-10
// 0 !HISTORY 2002-03-23 [sbliss] Added BFC statement; merged headers from files in distributions LDraw 0.27 and Complete.
// 0 !HISTORY 2002-04-25 [PTadmin] Official Update 2002-02
// 0 !HISTORY 2004-12-14 [guyvivan] BFC CCW
// 0 !HISTORY 2005-12-28 [PTadmin] Official Update 2005-01
// 0 !HISTORY 2007-06-24 [PTadmin] Header formatted for Contributor Agreement
// 0 !HISTORY 2008-07-01 [PTadmin] Official Update 2008-01
// 
// 
// 4 16 1 1 0 0.9239 1 0.3827 0.9239 0 0.3827 1 0 0
  [4,16,1,1,0,0.9239,1,0.3827,0.9239,0,0.3827,1,0,0],
// 5 24 1 0 0 1 1 0 0.9239 0 0.3827 0.9239 0 -0.3827
  [5,24,1,0,0,1,1,0,0.9239,0,0.3827,0.9239,0,-0.3827],
// 4 16 0.9239 1 0.3827 0.7071 1 0.7071 0.7071 0 0.7071 0.9239 0 0.3827
  [4,16,0.9239,1,0.3827,0.7071,1,0.7071,0.7071,0,0.7071,0.9239,0,0.3827],
// 5 24 0.9239 0 0.3827 0.9239 1 0.3827 0.7071 0 0.7071 1 0 0
  [5,24,0.9239,0,0.3827,0.9239,1,0.3827,0.7071,0,0.7071,1,0,0],
// 4 16 0.7071 1 0.7071 0.3827 1 0.9239 0.3827 0 0.9239 0.7071 0 0.7071
  [4,16,0.7071,1,0.7071,0.3827,1,0.9239,0.3827,0,0.9239,0.7071,0,0.7071],
// 5 24 0.7071 0 0.7071 0.7071 1 0.7071 0.3827 0 0.9239 0.9239 0 0.3827
  [5,24,0.7071,0,0.7071,0.7071,1,0.7071,0.3827,0,0.9239,0.9239,0,0.3827],
// 4 16 0.3827 1 0.9239 0 1 1 0 0 1 0.3827 0 0.9239
  [4,16,0.3827,1,0.9239,0,1,1,0,0,1,0.3827,0,0.9239],
// 5 24 0.3827 0 0.9239 0.3827 1 0.9239 0 0 1 0.7071 0 0.7071
  [5,24,0.3827,0,0.9239,0.3827,1,0.9239,0,0,1,0.7071,0,0.7071],
// 4 16 0 1 1 -0.3827 1 0.9239 -0.3827 0 0.9239 0 0 1
  [4,16,0,1,1,-0.3827,1,0.9239,-0.3827,0,0.9239,0,0,1],
// 5 24 0 0 1 0 1 1 -0.3827 0 0.9239 0.3827 0 0.9239
  [5,24,0,0,1,0,1,1,-0.3827,0,0.9239,0.3827,0,0.9239],
// 4 16 -0.3827 1 0.9239 -0.7071 1 0.7071 -0.7071 0 0.7071 -0.3827 0 0.9239
  [4,16,-0.3827,1,0.9239,-0.7071,1,0.7071,-0.7071,0,0.7071,-0.3827,0,0.9239],
// 5 24 -0.3827 0 0.9239 -0.3827 1 0.9239 -0.7071 0 0.7071 0 0 1
  [5,24,-0.3827,0,0.9239,-0.3827,1,0.9239,-0.7071,0,0.7071,0,0,1],
// 4 16 -0.7071 1 0.7071 -0.9239 1 0.3827 -0.9239 0 0.3827 -0.7071 0 0.7071
  [4,16,-0.7071,1,0.7071,-0.9239,1,0.3827,-0.9239,0,0.3827,-0.7071,0,0.7071],
// 5 24 -0.7071 0 0.7071 -0.7071 1 0.7071 -0.9239 0 0.3827 -0.3827 0 0.9239
  [5,24,-0.7071,0,0.7071,-0.7071,1,0.7071,-0.9239,0,0.3827,-0.3827,0,0.9239],
// 4 16 -0.9239 1 0.3827 -1 1 0 -1 0 0 -0.9239 0 0.3827
  [4,16,-0.9239,1,0.3827,-1,1,0,-1,0,0,-0.9239,0,0.3827],
// 5 24 -0.9239 0 0.3827 -0.9239 1 0.3827 -1 0 0 -0.7071 0 0.7071
  [5,24,-0.9239,0,0.3827,-0.9239,1,0.3827,-1,0,0,-0.7071,0,0.7071],
// 4 16 -1 1 0 -0.9239 1 -0.3827 -0.9239 0 -0.3827 -1 0 0
  [4,16,-1,1,0,-0.9239,1,-0.3827,-0.9239,0,-0.3827,-1,0,0],
// 5 24 -1 0 0 -1 1 0 -0.9239 0 -0.3827 -0.9239 0 0.3827
  [5,24,-1,0,0,-1,1,0,-0.9239,0,-0.3827,-0.9239,0,0.3827],
// 4 16 -0.9239 1 -0.3827 -0.7071 1 -0.7071 -0.7071 0 -0.7071 -0.9239 0 -0.3827
  [4,16,-0.9239,1,-0.3827,-0.7071,1,-0.7071,-0.7071,0,-0.7071,-0.9239,0,-0.3827],
// 5 24 -0.9239 0 -0.3827 -0.9239 1 -0.3827 -0.7071 0 -0.7071 -1 0 0
  [5,24,-0.9239,0,-0.3827,-0.9239,1,-0.3827,-0.7071,0,-0.7071,-1,0,0],
// 4 16 -0.7071 1 -0.7071 -0.3827 1 -0.9239 -0.3827 0 -0.9239 -0.7071 0 -0.7071
  [4,16,-0.7071,1,-0.7071,-0.3827,1,-0.9239,-0.3827,0,-0.9239,-0.7071,0,-0.7071],
// 5 24 -0.7071 0 -0.7071 -0.7071 1 -0.7071 -0.3827 0 -0.9239 -0.9239 0 -0.3827
  [5,24,-0.7071,0,-0.7071,-0.7071,1,-0.7071,-0.3827,0,-0.9239,-0.9239,0,-0.3827],
// 4 16 -0.3827 1 -0.9239 0 1 -1 0 0 -1 -0.3827 0 -0.9239
  [4,16,-0.3827,1,-0.9239,0,1,-1,0,0,-1,-0.3827,0,-0.9239],
// 5 24 -0.3827 0 -0.9239 -0.3827 1 -0.9239 0 0 -1 -0.7071 0 -0.7071
  [5,24,-0.3827,0,-0.9239,-0.3827,1,-0.9239,0,0,-1,-0.7071,0,-0.7071],
// 4 16 0 1 -1 0.3827 1 -0.9239 0.3827 0 -0.9239 0 0 -1
  [4,16,0,1,-1,0.3827,1,-0.9239,0.3827,0,-0.9239,0,0,-1],
// 5 24 0 0 -1 0 1 -1 0.3827 0 -0.9239 -0.3827 0 -0.9239
  [5,24,0,0,-1,0,1,-1,0.3827,0,-0.9239,-0.3827,0,-0.9239],
// 4 16 0.3827 1 -0.9239 0.7071 1 -0.7071 0.7071 0 -0.7071 0.3827 0 -0.9239
  [4,16,0.3827,1,-0.9239,0.7071,1,-0.7071,0.7071,0,-0.7071,0.3827,0,-0.9239],
// 5 24 0.3827 0 -0.9239 0.3827 1 -0.9239 0.7071 0 -0.7071 0 0 -1
  [5,24,0.3827,0,-0.9239,0.3827,1,-0.9239,0.7071,0,-0.7071,0,0,-1],
// 4 16 0.7071 1 -0.7071 0.9239 1 -0.3827 0.9239 0 -0.3827 0.7071 0 -0.7071
  [4,16,0.7071,1,-0.7071,0.9239,1,-0.3827,0.9239,0,-0.3827,0.7071,0,-0.7071],
// 5 24 0.7071 0 -0.7071 0.7071 1 -0.7071 0.9239 0 -0.3827 0.3827 0 -0.9239
  [5,24,0.7071,0,-0.7071,0.7071,1,-0.7071,0.9239,0,-0.3827,0.3827,0,-0.9239],
// 4 16 0.9239 1 -0.3827 1 1 0 1 0 0 0.9239 0 -0.3827
  [4,16,0.9239,1,-0.3827,1,1,0,1,0,0,0.9239,0,-0.3827],
// 5 24 0.9239 0 -0.3827 0.9239 1 -0.3827 1 0 0 0.7071 0 -0.7071
  [5,24,0.9239,0,-0.3827,0.9239,1,-0.3827,1,0,0,0.7071,0,-0.7071],
// 0
];
makepoly(ldraw_lib__4_4cyli(), line=0.2);
// file: ../p/4-4con2.scad
use <../lib.scad>
function ldraw_lib__4_4con2() = [
// 0 Cone  2 x 1.0
// 0 Name: 4-4con2.dat
// 0 Author: John Riley [jriley]
// 0 !LDRAW_ORG Primitive UPDATE 2012-01
// 0 !LICENSE Licensed under CC BY 2.0 and CC BY 4.0 : see CAreadme.txt
// 
// 0 BFC CERTIFY CCW
  [0,"BFC","CERTIFY"],
  [0,"BFC","CCW"],
// 
// 0 !HISTORY 2004-03-02 [PTadmin] Official Update 2004-01
// 0 !HISTORY 2007-06-24 [PTadmin] Header formatted for Contributor Agreement
// 0 !HISTORY 2008-07-01 [PTadmin] Official Update 2008-01
// 0 !HISTORY 2012-02-16 [Philo] Changed to CCW
// 0 !HISTORY 2012-03-30 [PTadmin] Official Update 2012-01
// 
// 
// 4 16 1.8478 1 0.7654 2.7717 0 1.1481 3 0 0 2 1 0
  [4,16,1.8478,1,0.7654,2.7717,0,1.1481,3,0,0,2,1,0],
// 4 16 1.4142 1 1.4142 2.1213 0 2.1213 2.7717 0 1.1481 1.8478 1 0.7654
  [4,16,1.4142,1,1.4142,2.1213,0,2.1213,2.7717,0,1.1481,1.8478,1,0.7654],
// 4 16 0.7654 1 1.8478 1.1481 0 2.7717 2.1213 0 2.1213 1.4142 1 1.4142
  [4,16,0.7654,1,1.8478,1.1481,0,2.7717,2.1213,0,2.1213,1.4142,1,1.4142],
// 4 16 0 1 2 0 0 3 1.1481 0 2.7717 0.7654 1 1.8478
  [4,16,0,1,2,0,0,3,1.1481,0,2.7717,0.7654,1,1.8478],
// 4 16 -0.7654 1 1.8478 -1.1481 0 2.7717 0 0 3 0 1 2
  [4,16,-0.7654,1,1.8478,-1.1481,0,2.7717,0,0,3,0,1,2],
// 4 16 -1.4142 1 1.4142 -2.1213 0 2.1213 -1.1481 0 2.7717 -0.7654 1 1.8478
  [4,16,-1.4142,1,1.4142,-2.1213,0,2.1213,-1.1481,0,2.7717,-0.7654,1,1.8478],
// 4 16 -1.8478 1 0.7654 -2.7717 0 1.1481 -2.1213 0 2.1213 -1.4142 1 1.4142
  [4,16,-1.8478,1,0.7654,-2.7717,0,1.1481,-2.1213,0,2.1213,-1.4142,1,1.4142],
// 4 16 -2 1 0 -3 0 0 -2.7717 0 1.1481 -1.8478 1 0.7654
  [4,16,-2,1,0,-3,0,0,-2.7717,0,1.1481,-1.8478,1,0.7654],
// 4 16 -1.8478 1 -0.7654 -2.7717 0 -1.1481 -3 0 0 -2 1 0
  [4,16,-1.8478,1,-0.7654,-2.7717,0,-1.1481,-3,0,0,-2,1,0],
// 4 16 -1.4142 1 -1.4142 -2.1213 0 -2.1213 -2.7717 0 -1.1481 -1.8478 1 -0.7654
  [4,16,-1.4142,1,-1.4142,-2.1213,0,-2.1213,-2.7717,0,-1.1481,-1.8478,1,-0.7654],
// 4 16 -0.7654 1 -1.8478 -1.1481 0 -2.7717 -2.1213 0 -2.1213 -1.4142 1 -1.4142
  [4,16,-0.7654,1,-1.8478,-1.1481,0,-2.7717,-2.1213,0,-2.1213,-1.4142,1,-1.4142],
// 4 16 0 1 -2 0 0 -3 -1.1481 0 -2.7717 -0.7654 1 -1.8478
  [4,16,0,1,-2,0,0,-3,-1.1481,0,-2.7717,-0.7654,1,-1.8478],
// 4 16 0.7654 1 -1.8478 1.1481 0 -2.7717 0 0 -3 0 1 -2
  [4,16,0.7654,1,-1.8478,1.1481,0,-2.7717,0,0,-3,0,1,-2],
// 4 16 1.4142 1 -1.4142 2.1213 0 -2.1213 1.1481 0 -2.7717 0.7654 1 -1.8478
  [4,16,1.4142,1,-1.4142,2.1213,0,-2.1213,1.1481,0,-2.7717,0.7654,1,-1.8478],
// 4 16 1.8478 1 -0.7654 2.7717 0 -1.1481 2.1213 0 -2.1213 1.4142 1 -1.4142
  [4,16,1.8478,1,-0.7654,2.7717,0,-1.1481,2.1213,0,-2.1213,1.4142,1,-1.4142],
// 4 16 2 1 0 3 0 0 2.7717 0 -1.1481 1.8478 1 -0.7654
  [4,16,2,1,0,3,0,0,2.7717,0,-1.1481,1.8478,1,-0.7654],
// 
// 5 24 2 1 0 3 0 0 1.8478 1 -0.7654 1.8478 1 0.7654
  [5,24,2,1,0,3,0,0,1.8478,1,-0.7654,1.8478,1,0.7654],
// 5 24 1.8478 1 0.7654 2.7717 0 1.1481 2 1 0 1.4142 1 1.4142
  [5,24,1.8478,1,0.7654,2.7717,0,1.1481,2,1,0,1.4142,1,1.4142],
// 5 24 1.4142 1 1.4142 2.1213 0 2.1213 1.8478 1 0.7654 0.7654 1 1.8478
  [5,24,1.4142,1,1.4142,2.1213,0,2.1213,1.8478,1,0.7654,0.7654,1,1.8478],
// 5 24 0.7654 1 1.8478 1.1481 0 2.7717 1.4142 1 1.4142 0 1 2
  [5,24,0.7654,1,1.8478,1.1481,0,2.7717,1.4142,1,1.4142,0,1,2],
// 5 24 0 1 2 0 0 3 0.7654 1 1.8478 -0.7654 1 1.8478
  [5,24,0,1,2,0,0,3,0.7654,1,1.8478,-0.7654,1,1.8478],
// 5 24 -0.7654 1 1.8478 -1.1481 0 2.7717 0 1 2 -1.4142 1 1.4142
  [5,24,-0.7654,1,1.8478,-1.1481,0,2.7717,0,1,2,-1.4142,1,1.4142],
// 5 24 -1.4142 1 1.4142 -2.1213 0 2.1213 -0.7654 1 1.8478 -1.8478 1 0.7654
  [5,24,-1.4142,1,1.4142,-2.1213,0,2.1213,-0.7654,1,1.8478,-1.8478,1,0.7654],
// 5 24 -1.8478 1 0.7654 -2.7717 0 1.1481 -1.4142 1 1.4142 -2 1 0
  [5,24,-1.8478,1,0.7654,-2.7717,0,1.1481,-1.4142,1,1.4142,-2,1,0],
// 5 24 -2 1 0 -3 0 0 -1.8478 1 0.7654 -1.8478 1 -0.7654
  [5,24,-2,1,0,-3,0,0,-1.8478,1,0.7654,-1.8478,1,-0.7654],
// 5 24 -1.8478 1 -0.7654 -2.7717 0 -1.1481 -2 1 0 -1.4142 1 -1.4142
  [5,24,-1.8478,1,-0.7654,-2.7717,0,-1.1481,-2,1,0,-1.4142,1,-1.4142],
// 5 24 -1.4142 1 -1.4142 -2.1213 0 -2.1213 -1.8478 1 -0.7654 -0.7654 1 -1.8478
  [5,24,-1.4142,1,-1.4142,-2.1213,0,-2.1213,-1.8478,1,-0.7654,-0.7654,1,-1.8478],
// 5 24 -0.7654 1 -1.8478 -1.1481 0 -2.7717 -1.4142 1 -1.4142 0 1 -2
  [5,24,-0.7654,1,-1.8478,-1.1481,0,-2.7717,-1.4142,1,-1.4142,0,1,-2],
// 5 24 0 1 -2 0 0 -3 -0.7654 1 -1.8478 0.7654 1 -1.8478
  [5,24,0,1,-2,0,0,-3,-0.7654,1,-1.8478,0.7654,1,-1.8478],
// 5 24 0.7654 1 -1.8478 1.1481 0 -2.7717 0 1 -2 1.4142 1 -1.4142
  [5,24,0.7654,1,-1.8478,1.1481,0,-2.7717,0,1,-2,1.4142,1,-1.4142],
// 5 24 1.4142 1 -1.4142 2.1213 0 -2.1213 0.7654 1 -1.8478 1.8478 1 -0.7654
  [5,24,1.4142,1,-1.4142,2.1213,0,-2.1213,0.7654,1,-1.8478,1.8478,1,-0.7654],
// 5 24 1.8478 1 -0.7654 2.7717 0 -1.1481 1.4142 1 -1.4142 2 1 0
  [5,24,1.8478,1,-0.7654,2.7717,0,-1.1481,1.4142,1,-1.4142,2,1,0],
];
makepoly(ldraw_lib__4_4con2(), line=0.2);
// main file
use <../lib.scad>
use <../p/4-4con2.scad>
use <../p/4-4cyli.scad>
use <../p/4-4disc.scad>
use <../p/4-4edge.scad>
use <../p/4-8sphe.scad>
use <../p/axle.scad>
function ldraw_lib__u1208b() = [
// 0 Technic Axle Adaptor Metal Long
// 0 Name: u1208b.dat
// 0 Author: Guy Vivan [guyvivan]
// 0 !LDRAW_ORG Part UPDATE 2010-01
// 0 !LICENSE Licensed under CC BY 2.0 and CC BY 4.0 : see CAreadme.txt
// 
// 0 BFC CERTIFY CCW
  [0,"BFC","CERTIFY"],
  [0,"BFC","CCW"],
// 
// 0 !CMDLINE -c383
// 
// 0 !HISTORY 2010-04-05 [PTadmin] Official Update 2010-01
// 
// 
// 1 16 20 0 0 0 -40 0 -1 0 0 0 0 -1 axle.dat
  [1,16,20,0,0,0,-40,0,-1,0,0,0,0,-1, ldraw_lib__axle()],
// 1 16 20 0 0 0 -1 0 -3 0 0 0 0 -3 4-4edge.dat
  [1,16,20,0,0,0,-1,0,-3,0,0,0,0,-3, ldraw_lib__4_4edge()],
// 1 16 20 0 0 0 19 0 -3 0 0 0 0 -3 4-4cyli.dat
  [1,16,20,0,0,0,19,0,-3,0,0,0,0,-3, ldraw_lib__4_4cyli()],
// 1 16 39 0 0 0 -1 0 -3 0 0 0 0 -3 4-4edge.dat
  [1,16,39,0,0,0,-1,0,-3,0,0,0,0,-3, ldraw_lib__4_4edge()],
// 1 16 40 0 0 0 -1 0 -2 0 0 0 0 -2 4-4edge.dat
  [1,16,40,0,0,0,-1,0,-2,0,0,0,0,-2, ldraw_lib__4_4edge()],
// 1 16 39 0 0 0 1 0 -1 0 0 0 0 -1 4-4con2.dat
  [1,16,39,0,0,0,1,0,-1,0,0,0,0,-1, ldraw_lib__4_4con2()],
// 1 16 40 0 0 0 -1 0 -2 0 0 0 0 -2 4-4disc.dat
  [1,16,40,0,0,0,-1,0,-2,0,0,0,0,-2, ldraw_lib__4_4disc()],
// 1 16 20 0 0 0 1 0 -3 0 0 0 0 -3 4-4disc.dat
  [1,16,20,0,0,0,1,0,-3,0,0,0,0,-3, ldraw_lib__4_4disc()],
// 1 16 -20 0 0 0 -1 0 -6 0 0 0 0 -6 4-4edge.dat
  [1,16,-20,0,0,0,-1,0,-6,0,0,0,0,-6, ldraw_lib__4_4edge()],
// 1 16 -20 0 0 0 -1 0 -6 0 0 0 0 -6 4-4disc.dat
  [1,16,-20,0,0,0,-1,0,-6,0,0,0,0,-6, ldraw_lib__4_4disc()],
// 1 16 -20 0 0 0 -1 0 -6 0 0 0 0 -6 4-8sphe.dat
  [1,16,-20,0,0,0,-1,0,-6,0,0,0,0,-6, ldraw_lib__4_8sphe()],
// 0
];
makepoly(ldraw_lib__u1208b(), line=0.2);
